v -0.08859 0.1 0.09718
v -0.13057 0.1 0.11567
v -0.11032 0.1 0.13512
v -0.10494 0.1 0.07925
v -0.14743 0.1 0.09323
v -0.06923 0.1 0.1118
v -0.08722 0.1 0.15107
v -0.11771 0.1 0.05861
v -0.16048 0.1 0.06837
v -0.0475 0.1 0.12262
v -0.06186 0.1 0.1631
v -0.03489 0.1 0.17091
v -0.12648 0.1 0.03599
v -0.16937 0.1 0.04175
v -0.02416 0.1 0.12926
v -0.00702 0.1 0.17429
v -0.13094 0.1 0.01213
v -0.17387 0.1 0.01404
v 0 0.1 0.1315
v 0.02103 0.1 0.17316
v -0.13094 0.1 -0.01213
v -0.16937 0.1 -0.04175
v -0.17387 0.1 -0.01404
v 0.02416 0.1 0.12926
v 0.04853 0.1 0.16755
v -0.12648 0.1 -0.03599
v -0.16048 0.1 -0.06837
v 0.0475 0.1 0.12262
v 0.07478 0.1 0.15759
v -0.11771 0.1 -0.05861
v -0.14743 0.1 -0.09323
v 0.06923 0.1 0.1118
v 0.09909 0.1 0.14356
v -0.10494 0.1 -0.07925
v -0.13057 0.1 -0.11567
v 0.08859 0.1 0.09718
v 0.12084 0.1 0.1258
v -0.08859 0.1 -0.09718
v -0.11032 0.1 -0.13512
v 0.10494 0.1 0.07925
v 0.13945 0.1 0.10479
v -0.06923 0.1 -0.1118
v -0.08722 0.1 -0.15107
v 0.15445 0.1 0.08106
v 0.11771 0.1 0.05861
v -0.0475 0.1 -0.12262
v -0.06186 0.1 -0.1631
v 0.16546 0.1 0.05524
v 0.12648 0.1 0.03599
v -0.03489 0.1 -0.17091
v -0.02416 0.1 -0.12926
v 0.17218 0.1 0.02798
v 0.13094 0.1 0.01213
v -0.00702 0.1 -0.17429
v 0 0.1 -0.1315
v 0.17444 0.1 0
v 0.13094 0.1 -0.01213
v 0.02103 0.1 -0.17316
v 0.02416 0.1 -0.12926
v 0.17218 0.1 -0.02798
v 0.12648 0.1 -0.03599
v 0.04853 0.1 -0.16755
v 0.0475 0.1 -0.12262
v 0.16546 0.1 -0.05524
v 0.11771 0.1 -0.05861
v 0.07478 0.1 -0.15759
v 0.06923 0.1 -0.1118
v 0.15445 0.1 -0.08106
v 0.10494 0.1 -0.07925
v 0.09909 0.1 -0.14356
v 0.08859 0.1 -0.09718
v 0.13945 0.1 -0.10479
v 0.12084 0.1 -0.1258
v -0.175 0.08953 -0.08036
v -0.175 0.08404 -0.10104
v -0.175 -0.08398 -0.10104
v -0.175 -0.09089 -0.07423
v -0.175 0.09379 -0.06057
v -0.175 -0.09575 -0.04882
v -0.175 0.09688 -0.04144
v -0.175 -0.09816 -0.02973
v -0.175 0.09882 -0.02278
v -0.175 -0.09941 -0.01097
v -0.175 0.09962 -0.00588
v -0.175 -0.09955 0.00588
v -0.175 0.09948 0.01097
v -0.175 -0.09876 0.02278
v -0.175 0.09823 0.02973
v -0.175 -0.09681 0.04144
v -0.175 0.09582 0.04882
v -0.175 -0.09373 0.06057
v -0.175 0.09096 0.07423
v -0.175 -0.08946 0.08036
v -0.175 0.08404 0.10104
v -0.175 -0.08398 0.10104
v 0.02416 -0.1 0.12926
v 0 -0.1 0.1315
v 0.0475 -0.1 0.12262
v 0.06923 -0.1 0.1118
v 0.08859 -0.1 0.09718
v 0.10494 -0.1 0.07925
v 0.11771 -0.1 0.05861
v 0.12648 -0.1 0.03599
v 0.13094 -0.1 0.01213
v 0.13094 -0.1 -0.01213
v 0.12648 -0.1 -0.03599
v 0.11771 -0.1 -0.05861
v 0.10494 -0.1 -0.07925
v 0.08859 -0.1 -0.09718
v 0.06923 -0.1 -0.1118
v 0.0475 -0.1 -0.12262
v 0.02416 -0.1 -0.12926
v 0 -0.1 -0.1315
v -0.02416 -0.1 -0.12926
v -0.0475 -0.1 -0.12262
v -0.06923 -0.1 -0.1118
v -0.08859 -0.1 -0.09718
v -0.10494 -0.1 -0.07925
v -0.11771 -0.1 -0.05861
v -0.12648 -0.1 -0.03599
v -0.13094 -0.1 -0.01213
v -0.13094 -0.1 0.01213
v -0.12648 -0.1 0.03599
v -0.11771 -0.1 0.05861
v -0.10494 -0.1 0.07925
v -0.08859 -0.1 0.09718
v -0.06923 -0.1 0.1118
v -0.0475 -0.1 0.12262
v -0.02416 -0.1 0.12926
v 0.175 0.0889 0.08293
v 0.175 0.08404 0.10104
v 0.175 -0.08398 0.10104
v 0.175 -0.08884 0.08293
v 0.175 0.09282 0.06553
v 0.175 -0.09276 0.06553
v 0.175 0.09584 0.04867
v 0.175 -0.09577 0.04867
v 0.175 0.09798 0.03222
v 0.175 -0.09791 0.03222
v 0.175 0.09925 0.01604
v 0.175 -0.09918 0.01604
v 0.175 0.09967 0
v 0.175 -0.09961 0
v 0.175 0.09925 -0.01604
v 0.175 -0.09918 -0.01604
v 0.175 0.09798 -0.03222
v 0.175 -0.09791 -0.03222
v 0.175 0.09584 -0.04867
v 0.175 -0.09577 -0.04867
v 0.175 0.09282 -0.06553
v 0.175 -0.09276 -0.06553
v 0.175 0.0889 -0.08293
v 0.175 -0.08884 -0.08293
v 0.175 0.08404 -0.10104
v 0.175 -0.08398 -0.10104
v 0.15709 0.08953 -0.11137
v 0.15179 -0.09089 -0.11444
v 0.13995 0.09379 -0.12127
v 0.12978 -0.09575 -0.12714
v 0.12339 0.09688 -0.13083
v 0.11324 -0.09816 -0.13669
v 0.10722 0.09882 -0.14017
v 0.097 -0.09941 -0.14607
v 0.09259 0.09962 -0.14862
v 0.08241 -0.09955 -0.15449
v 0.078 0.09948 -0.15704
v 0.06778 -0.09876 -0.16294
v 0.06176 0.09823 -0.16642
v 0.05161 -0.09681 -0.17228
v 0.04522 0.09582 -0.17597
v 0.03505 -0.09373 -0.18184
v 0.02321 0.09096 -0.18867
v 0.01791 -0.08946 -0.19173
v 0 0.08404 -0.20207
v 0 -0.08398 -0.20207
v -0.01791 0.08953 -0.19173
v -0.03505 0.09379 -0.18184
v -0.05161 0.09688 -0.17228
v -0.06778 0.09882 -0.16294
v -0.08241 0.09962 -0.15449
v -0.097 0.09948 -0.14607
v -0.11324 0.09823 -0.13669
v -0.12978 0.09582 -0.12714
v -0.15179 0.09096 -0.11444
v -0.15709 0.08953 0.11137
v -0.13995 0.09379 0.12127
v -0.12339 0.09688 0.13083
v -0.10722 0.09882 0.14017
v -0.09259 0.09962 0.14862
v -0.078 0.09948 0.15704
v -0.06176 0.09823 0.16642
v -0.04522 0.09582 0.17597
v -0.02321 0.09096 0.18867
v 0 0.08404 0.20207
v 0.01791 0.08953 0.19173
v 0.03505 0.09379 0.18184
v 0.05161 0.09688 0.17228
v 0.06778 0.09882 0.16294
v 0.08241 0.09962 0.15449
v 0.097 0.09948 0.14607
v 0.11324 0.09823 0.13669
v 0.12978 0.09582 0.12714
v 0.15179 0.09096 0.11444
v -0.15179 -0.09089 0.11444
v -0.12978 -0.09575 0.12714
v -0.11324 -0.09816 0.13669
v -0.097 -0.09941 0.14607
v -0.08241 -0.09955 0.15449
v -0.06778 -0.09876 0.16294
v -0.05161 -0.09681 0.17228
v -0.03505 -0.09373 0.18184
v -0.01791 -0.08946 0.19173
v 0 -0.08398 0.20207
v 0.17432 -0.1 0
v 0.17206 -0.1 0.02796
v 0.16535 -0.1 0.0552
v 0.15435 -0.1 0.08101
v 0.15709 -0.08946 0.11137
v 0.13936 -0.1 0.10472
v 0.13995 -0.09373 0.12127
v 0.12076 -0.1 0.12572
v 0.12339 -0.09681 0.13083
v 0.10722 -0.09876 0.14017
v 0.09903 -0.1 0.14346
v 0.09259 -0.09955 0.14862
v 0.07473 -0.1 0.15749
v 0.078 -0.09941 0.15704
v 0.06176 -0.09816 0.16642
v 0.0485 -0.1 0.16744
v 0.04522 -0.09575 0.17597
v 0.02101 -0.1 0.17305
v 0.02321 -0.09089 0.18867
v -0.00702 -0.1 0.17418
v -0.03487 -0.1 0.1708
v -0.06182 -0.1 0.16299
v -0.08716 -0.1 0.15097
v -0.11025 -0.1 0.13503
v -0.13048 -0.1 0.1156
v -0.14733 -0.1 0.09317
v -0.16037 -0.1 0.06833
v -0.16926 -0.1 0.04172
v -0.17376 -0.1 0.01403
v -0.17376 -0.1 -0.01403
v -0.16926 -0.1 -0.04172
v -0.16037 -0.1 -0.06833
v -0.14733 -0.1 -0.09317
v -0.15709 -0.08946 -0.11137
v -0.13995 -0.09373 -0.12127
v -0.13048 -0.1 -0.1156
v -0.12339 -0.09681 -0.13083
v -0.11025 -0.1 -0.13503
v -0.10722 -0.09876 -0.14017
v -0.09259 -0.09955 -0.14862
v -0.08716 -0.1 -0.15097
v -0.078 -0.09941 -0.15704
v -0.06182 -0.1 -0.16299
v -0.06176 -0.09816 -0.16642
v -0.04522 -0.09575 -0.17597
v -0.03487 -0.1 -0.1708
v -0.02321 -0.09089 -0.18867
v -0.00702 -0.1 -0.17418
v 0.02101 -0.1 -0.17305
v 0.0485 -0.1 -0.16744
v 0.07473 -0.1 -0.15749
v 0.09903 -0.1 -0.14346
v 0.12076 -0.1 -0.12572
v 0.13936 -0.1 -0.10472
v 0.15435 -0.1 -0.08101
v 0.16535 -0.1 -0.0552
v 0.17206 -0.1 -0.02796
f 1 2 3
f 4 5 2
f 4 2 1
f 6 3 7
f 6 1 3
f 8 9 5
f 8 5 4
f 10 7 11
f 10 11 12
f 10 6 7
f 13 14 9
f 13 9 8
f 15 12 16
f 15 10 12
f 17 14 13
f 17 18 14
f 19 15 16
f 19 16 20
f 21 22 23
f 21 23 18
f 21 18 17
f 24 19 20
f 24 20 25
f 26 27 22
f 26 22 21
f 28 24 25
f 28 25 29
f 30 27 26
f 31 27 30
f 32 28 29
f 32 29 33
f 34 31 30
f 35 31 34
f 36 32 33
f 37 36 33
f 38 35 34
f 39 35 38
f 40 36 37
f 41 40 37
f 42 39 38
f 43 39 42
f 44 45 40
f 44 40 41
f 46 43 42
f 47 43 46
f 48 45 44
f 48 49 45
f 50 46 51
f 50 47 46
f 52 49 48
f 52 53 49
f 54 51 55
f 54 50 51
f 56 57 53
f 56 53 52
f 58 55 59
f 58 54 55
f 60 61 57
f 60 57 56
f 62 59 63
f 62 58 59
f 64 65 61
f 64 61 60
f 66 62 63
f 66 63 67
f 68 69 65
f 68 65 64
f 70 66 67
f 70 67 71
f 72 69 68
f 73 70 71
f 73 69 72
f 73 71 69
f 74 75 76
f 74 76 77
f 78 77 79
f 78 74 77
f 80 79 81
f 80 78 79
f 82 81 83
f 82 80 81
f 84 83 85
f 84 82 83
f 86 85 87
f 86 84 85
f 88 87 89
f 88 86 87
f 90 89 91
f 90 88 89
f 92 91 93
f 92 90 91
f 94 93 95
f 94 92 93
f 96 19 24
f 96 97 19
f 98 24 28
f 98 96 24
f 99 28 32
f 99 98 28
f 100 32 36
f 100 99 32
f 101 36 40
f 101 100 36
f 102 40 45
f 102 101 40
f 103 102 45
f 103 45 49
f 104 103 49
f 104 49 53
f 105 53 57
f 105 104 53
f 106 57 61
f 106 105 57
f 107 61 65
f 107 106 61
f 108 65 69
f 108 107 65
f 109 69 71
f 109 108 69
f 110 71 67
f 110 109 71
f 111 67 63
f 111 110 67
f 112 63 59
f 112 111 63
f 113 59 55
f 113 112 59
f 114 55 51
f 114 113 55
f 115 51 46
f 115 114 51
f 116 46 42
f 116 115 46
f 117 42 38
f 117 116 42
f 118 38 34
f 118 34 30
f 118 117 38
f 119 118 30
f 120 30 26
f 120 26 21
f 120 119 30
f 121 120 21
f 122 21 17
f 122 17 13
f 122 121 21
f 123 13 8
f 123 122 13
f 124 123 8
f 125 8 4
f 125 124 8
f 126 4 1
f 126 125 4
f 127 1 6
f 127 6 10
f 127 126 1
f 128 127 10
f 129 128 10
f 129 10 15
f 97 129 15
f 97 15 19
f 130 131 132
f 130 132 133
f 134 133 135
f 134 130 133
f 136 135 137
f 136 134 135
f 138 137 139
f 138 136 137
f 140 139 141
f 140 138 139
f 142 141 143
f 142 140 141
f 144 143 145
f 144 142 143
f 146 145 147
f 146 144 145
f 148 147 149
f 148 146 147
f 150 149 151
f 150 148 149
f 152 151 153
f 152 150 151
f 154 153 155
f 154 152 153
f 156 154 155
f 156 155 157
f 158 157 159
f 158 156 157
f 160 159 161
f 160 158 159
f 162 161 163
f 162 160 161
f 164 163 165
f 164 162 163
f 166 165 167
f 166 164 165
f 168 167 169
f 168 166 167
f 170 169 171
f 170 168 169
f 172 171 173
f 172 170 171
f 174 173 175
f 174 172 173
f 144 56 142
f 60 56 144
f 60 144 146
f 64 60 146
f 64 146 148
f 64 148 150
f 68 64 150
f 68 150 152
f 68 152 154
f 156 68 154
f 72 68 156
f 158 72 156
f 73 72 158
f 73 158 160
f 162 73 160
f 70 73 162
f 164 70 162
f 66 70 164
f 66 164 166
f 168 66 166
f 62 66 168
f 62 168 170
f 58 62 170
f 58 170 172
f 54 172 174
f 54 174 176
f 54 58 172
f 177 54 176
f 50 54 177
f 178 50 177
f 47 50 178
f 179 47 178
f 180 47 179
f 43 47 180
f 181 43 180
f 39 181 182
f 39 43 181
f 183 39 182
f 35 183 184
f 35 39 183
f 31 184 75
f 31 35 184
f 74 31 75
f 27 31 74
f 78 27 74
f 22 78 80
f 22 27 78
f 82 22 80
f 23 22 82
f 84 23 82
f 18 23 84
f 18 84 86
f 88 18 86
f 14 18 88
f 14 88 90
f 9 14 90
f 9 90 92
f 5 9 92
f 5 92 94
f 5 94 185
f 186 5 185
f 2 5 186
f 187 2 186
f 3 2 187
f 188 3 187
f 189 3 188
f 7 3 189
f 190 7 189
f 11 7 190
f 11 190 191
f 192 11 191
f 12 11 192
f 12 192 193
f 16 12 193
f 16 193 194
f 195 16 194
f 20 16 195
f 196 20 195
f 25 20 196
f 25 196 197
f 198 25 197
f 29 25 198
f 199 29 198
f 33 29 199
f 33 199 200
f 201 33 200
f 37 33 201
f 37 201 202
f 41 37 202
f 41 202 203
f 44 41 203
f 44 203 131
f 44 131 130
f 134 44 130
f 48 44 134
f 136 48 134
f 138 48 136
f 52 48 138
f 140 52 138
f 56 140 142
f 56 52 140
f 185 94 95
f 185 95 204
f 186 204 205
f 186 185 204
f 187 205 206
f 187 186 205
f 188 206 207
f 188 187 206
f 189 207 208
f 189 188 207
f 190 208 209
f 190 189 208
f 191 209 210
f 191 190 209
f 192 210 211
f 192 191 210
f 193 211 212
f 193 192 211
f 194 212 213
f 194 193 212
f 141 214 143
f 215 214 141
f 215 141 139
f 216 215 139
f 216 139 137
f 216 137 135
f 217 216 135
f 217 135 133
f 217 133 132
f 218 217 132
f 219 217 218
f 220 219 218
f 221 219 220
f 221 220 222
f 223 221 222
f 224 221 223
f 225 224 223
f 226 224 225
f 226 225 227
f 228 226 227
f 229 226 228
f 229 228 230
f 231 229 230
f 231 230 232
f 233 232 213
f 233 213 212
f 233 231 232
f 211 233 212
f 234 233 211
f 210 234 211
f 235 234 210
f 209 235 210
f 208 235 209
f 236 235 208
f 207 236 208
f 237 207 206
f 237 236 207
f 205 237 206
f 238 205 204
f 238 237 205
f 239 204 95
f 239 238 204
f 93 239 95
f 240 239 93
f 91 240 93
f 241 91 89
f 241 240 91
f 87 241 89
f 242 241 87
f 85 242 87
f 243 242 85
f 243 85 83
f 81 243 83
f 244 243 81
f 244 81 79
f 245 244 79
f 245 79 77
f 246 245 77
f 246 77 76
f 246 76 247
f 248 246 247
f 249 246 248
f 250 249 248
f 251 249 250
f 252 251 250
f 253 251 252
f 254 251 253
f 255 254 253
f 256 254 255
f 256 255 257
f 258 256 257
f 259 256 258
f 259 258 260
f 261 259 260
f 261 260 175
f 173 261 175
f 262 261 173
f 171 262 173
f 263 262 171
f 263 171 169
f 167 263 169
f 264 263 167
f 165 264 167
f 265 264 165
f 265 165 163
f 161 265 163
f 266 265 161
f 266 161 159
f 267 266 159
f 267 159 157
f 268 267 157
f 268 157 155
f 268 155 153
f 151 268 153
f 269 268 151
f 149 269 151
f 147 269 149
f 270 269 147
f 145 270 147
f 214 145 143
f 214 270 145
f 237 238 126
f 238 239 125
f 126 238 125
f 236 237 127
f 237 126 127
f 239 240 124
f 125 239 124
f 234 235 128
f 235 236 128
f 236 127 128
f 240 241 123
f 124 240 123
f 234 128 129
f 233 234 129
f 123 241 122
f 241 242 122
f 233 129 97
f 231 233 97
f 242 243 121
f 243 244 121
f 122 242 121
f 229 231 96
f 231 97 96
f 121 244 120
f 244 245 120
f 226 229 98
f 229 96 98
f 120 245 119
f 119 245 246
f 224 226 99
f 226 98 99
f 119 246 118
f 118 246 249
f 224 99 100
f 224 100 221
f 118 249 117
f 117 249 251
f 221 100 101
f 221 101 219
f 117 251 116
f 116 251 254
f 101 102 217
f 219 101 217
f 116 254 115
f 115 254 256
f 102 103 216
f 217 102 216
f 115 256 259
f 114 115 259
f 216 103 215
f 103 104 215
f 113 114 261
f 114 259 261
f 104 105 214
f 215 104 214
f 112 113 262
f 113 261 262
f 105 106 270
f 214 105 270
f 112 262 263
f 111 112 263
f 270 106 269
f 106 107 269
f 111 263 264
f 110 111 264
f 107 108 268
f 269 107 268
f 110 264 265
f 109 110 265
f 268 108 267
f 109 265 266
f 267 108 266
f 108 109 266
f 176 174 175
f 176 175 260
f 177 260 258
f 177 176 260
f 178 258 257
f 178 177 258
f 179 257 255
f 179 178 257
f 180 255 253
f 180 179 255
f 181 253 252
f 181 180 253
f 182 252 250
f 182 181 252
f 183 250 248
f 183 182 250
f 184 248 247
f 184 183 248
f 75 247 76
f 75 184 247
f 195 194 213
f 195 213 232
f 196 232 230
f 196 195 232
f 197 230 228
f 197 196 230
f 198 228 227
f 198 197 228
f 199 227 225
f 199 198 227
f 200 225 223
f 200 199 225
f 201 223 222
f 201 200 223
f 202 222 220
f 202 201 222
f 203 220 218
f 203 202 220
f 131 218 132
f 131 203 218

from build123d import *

# Parameters (mm, degrees)
SKETCH2_R           = 0.1315
BOSS_EXTRUDE1_DEPTH = 0.1
SKETCH3_OUTSIDE_W   = 3.156
SKETCH3_OUTSIDE_H   = 3.21
SKETCH3_OUTSIDE_R   = 0.174435158
CUT_EXTRUDE1_DEPTH  = 0.2
CUT_EXTRUDE1_DRAFT  = -60
SKETCH4_OUTSIDE_W   = 3.156
SKETCH4_OUTSIDE_H   = 3.21
SKETCH4_OUTSIDE_R   = 0.174320946
CUT_EXTRUDE2_DEPTH  = 0.2
CUT_EXTRUDE2_DRAFT  = -60


with BuildPart() as part:
    # Sketch2 → Boss-Extrude1 (new, symmetric)
    with BuildSketch(Plane(origin=(0, 0, 0), x_dir=(1, 0, 0), z_dir=(0, 1, 0))):
        Polygon((0, -0.202072594), (0.175, -0.101036297), (0.175, 0.101036297), (0, 0.202072594), (-0.175, 0.101036297), (-0.175, -0.101036297), align=None)
        with Locations(Location((0, 0, 0), (0, 0, 270))):
            Circle(SKETCH2_R, mode=Mode.SUBTRACT)
    extrude(amount=BOSS_EXTRUDE1_DEPTH, both=True)


with BuildPart() as cut_extrude1_tool:
    # Sketch3 outside → Cut-Extrude1 (with draft: the straight prism first)
    with BuildSketch(Plane(origin=(0, 0.1, 0), x_dir=(1, 0, 0), z_dir=(0, 1, 0))):
        Rectangle(SKETCH3_OUTSIDE_W, SKETCH3_OUTSIDE_H)
        Circle(SKETCH3_OUTSIDE_R, mode=Mode.SUBTRACT)
    extrude(amount=-CUT_EXTRUDE1_DEPTH)
    # Cut-Extrude1: the draft: its side faces are tilted about the plane it starts from
    cut_extrude1_sides = [cut_extrude1_tool.faces().sort_by_distance(p)[0] for p in [
        (0, 0, 1.605),
        (1.578, 0, 0),
        (0, 0, -1.605),
        (-1.578, 0, 0),
        (-0.174435158, 0, 0),
    ]]
    draft(cut_extrude1_sides, Plane(origin=(0, 0.1, 0), x_dir=(1, 0, 0), z_dir=(0, 1, 0)), CUT_EXTRUDE1_DRAFT)


with BuildPart() as part_1:
    add(part.part)

    # Cut-Extrude1: cut by cut_extrude1_tool
    add(cut_extrude1_tool.part, mode=Mode.SUBTRACT)


with BuildPart() as cut_extrude2_tool:
    # Sketch4 outside → Cut-Extrude2 (with draft: the straight prism first)
    with BuildSketch(Plane.XZ.offset(0.1)):
        Rectangle(SKETCH4_OUTSIDE_W, SKETCH4_OUTSIDE_H)
        Circle(SKETCH4_OUTSIDE_R, mode=Mode.SUBTRACT)
    extrude(amount=-CUT_EXTRUDE2_DEPTH)
    # Cut-Extrude2: the draft: its side faces are tilted about the plane it starts from
    cut_extrude2_sides = [cut_extrude2_tool.faces().sort_by_distance(p)[0] for p in [
        (0, 0, -1.605),
        (1.578, 0, 0),
        (0, 0, 1.605),
        (-1.578, 0, 0),
        (-0.174320946, 0, 0),
    ]]
    draft(cut_extrude2_sides, Plane.XZ.offset(0.1), CUT_EXTRUDE2_DRAFT)


with BuildPart() as part_2:
    add(part_1.part)

    # Cut-Extrude2: cut by cut_extrude2_tool
    add(cut_extrude2_tool.part, mode=Mode.SUBTRACT)


solid = part_2.part
